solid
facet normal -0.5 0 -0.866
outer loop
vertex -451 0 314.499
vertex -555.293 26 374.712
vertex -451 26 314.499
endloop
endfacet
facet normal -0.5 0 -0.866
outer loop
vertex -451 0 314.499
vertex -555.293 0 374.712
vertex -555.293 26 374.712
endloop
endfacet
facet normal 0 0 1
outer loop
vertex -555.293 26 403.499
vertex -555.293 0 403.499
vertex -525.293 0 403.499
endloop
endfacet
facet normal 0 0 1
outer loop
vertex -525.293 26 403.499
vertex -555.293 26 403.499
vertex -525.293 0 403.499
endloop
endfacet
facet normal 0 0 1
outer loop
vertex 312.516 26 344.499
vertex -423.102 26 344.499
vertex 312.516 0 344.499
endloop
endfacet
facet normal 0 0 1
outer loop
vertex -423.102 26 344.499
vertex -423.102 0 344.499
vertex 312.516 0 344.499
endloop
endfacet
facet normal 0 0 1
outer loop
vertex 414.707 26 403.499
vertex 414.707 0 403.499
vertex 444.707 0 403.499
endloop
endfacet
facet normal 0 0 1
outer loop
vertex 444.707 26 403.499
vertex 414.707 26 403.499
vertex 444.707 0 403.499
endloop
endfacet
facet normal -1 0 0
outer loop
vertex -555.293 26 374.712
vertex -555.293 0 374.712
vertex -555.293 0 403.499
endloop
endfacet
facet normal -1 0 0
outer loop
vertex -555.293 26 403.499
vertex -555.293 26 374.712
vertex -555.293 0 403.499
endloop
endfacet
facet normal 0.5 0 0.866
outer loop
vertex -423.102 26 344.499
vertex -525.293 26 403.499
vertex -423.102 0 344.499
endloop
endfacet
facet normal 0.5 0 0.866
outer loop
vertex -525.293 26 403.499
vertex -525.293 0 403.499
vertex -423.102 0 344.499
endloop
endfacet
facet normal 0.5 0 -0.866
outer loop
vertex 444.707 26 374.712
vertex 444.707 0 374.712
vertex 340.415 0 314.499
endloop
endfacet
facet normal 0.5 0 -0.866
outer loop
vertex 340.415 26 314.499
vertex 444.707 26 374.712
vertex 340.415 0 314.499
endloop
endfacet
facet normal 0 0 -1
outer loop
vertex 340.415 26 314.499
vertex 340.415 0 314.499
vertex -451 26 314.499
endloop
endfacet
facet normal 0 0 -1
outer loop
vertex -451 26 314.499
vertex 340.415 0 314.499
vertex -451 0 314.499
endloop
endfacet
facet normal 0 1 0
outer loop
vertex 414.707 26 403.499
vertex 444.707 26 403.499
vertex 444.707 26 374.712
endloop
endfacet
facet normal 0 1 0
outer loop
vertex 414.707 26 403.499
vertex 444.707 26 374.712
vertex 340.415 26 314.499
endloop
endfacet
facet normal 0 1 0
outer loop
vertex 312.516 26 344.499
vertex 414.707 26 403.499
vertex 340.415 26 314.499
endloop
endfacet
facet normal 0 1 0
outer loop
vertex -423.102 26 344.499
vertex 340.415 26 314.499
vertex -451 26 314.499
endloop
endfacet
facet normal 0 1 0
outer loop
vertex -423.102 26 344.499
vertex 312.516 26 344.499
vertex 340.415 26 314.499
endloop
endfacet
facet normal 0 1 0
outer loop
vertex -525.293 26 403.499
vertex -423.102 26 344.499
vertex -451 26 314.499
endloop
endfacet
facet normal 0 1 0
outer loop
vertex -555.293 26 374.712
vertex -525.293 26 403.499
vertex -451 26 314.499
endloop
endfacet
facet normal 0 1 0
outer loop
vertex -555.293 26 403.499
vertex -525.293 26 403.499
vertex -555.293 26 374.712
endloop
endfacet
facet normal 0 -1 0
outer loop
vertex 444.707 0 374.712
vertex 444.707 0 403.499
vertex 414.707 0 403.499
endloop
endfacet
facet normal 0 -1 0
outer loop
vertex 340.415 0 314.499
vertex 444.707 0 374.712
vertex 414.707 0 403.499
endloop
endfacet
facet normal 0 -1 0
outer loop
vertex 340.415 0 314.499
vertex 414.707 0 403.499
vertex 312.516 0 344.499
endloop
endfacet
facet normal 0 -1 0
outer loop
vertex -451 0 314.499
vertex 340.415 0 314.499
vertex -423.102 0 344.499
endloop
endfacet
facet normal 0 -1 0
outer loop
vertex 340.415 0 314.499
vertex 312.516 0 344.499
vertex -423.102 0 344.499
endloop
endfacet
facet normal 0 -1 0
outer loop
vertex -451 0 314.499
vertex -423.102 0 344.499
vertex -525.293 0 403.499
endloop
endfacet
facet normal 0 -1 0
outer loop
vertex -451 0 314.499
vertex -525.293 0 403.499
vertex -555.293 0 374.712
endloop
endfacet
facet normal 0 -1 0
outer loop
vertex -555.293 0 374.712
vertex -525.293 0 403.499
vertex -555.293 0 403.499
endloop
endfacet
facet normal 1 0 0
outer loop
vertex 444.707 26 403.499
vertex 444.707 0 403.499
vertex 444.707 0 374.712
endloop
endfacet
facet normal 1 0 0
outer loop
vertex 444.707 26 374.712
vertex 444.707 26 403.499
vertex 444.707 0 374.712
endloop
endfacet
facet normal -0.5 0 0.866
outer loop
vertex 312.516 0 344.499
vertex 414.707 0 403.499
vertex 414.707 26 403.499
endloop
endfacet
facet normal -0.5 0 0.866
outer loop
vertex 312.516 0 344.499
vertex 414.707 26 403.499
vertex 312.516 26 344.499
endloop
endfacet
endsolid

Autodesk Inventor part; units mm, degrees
ref_plane "YZ Plane" through (0, 0, 0) normal (1, 0, 0) x (0, 1, 0)
ref_plane "XZ Plane" through (0, 0, 0) normal (0, 1, 0) x (-1, 0, 0)
ref_plane "XY Plane" through (0, 0, 0) normal (0, 0, 1) x (1, 0, 0)
sketch "Sketch1" plane through (0, 0, 0) normal (0, 1, 0) x (-1, 0, 0)
  line L0 (555.2926, 403.499) -> (-444.7074, 403.499)
  line L1 (-444.7074, 403.499) -> (-444.7074, 314.499)
  line L2 (-444.7074, 314.499) -> (555.2926, 314.499)
  line L3 (555.2926, 314.499) -> (555.2926, 403.499)
  line L4 (423.1016, 344.499) -> (-312.5164, 344.499)
  line L5 (-444.7074, 403.499) -> (-414.7074, 403.499)
  line L6 (-414.7074, 403.499) -> (-414.7074, 374.7123)
  line L7 (-414.7074, 374.7123) -> (-444.7074, 374.7123)
  line L8 (-444.7074, 374.7123) -> (-444.7074, 403.499)
  line L9 (555.2926, 403.499) -> (525.2926, 403.499)
  line L10 (525.2926, 403.499) -> (525.2926, 374.7123)
  line L11 (525.2926, 374.7123) -> (555.2926, 374.7123)
  line L12 (555.2926, 374.7123) -> (555.2926, 403.499)
  line L13 (525.2926, 403.499) -> (423.1016, 344.499)
  line L14 (-414.7074, 403.499) -> (-312.5164, 344.499)
  line L15 (-444.7074, 374.7123) -> (-340.4148, 314.499)
  line L16 (555.2926, 374.7123) -> (451, 314.499)
  point P0 (0, 0)
  point P1 (555.2926, 368.7138)
  point P2 (522.9975, 314.499)
  point P3 (-444.7074, 354.0015)
  point P4 (-397.9975, 314.499)
  point P5 (525.2926, 403.499)
  point P6 (525.2926, 403.499)
  dimension "d0" = 1000
  dimension "d5" = 30
  dimension "d11" = 89
  dimension "d12" = 30
  dimension "d13" = 30
  dimension "d17" = 60
  dimension "d18" = 60
extrude "Extrusion1" add sketch "Sketch1" along normal blind 26 contours L3 L11 L10 L0 | L10 L11 L16 L2 L15 L7 L6 L14 L4 L13 | L6 L7 L1 L0
sketch "Sketch2" plane through (0, 26, 0) normal (0, 1, 0) x (1, 0, 0)
  point P0 (0, 0)
properties part number "UcreplenieX" material "Aluminum 6061"
